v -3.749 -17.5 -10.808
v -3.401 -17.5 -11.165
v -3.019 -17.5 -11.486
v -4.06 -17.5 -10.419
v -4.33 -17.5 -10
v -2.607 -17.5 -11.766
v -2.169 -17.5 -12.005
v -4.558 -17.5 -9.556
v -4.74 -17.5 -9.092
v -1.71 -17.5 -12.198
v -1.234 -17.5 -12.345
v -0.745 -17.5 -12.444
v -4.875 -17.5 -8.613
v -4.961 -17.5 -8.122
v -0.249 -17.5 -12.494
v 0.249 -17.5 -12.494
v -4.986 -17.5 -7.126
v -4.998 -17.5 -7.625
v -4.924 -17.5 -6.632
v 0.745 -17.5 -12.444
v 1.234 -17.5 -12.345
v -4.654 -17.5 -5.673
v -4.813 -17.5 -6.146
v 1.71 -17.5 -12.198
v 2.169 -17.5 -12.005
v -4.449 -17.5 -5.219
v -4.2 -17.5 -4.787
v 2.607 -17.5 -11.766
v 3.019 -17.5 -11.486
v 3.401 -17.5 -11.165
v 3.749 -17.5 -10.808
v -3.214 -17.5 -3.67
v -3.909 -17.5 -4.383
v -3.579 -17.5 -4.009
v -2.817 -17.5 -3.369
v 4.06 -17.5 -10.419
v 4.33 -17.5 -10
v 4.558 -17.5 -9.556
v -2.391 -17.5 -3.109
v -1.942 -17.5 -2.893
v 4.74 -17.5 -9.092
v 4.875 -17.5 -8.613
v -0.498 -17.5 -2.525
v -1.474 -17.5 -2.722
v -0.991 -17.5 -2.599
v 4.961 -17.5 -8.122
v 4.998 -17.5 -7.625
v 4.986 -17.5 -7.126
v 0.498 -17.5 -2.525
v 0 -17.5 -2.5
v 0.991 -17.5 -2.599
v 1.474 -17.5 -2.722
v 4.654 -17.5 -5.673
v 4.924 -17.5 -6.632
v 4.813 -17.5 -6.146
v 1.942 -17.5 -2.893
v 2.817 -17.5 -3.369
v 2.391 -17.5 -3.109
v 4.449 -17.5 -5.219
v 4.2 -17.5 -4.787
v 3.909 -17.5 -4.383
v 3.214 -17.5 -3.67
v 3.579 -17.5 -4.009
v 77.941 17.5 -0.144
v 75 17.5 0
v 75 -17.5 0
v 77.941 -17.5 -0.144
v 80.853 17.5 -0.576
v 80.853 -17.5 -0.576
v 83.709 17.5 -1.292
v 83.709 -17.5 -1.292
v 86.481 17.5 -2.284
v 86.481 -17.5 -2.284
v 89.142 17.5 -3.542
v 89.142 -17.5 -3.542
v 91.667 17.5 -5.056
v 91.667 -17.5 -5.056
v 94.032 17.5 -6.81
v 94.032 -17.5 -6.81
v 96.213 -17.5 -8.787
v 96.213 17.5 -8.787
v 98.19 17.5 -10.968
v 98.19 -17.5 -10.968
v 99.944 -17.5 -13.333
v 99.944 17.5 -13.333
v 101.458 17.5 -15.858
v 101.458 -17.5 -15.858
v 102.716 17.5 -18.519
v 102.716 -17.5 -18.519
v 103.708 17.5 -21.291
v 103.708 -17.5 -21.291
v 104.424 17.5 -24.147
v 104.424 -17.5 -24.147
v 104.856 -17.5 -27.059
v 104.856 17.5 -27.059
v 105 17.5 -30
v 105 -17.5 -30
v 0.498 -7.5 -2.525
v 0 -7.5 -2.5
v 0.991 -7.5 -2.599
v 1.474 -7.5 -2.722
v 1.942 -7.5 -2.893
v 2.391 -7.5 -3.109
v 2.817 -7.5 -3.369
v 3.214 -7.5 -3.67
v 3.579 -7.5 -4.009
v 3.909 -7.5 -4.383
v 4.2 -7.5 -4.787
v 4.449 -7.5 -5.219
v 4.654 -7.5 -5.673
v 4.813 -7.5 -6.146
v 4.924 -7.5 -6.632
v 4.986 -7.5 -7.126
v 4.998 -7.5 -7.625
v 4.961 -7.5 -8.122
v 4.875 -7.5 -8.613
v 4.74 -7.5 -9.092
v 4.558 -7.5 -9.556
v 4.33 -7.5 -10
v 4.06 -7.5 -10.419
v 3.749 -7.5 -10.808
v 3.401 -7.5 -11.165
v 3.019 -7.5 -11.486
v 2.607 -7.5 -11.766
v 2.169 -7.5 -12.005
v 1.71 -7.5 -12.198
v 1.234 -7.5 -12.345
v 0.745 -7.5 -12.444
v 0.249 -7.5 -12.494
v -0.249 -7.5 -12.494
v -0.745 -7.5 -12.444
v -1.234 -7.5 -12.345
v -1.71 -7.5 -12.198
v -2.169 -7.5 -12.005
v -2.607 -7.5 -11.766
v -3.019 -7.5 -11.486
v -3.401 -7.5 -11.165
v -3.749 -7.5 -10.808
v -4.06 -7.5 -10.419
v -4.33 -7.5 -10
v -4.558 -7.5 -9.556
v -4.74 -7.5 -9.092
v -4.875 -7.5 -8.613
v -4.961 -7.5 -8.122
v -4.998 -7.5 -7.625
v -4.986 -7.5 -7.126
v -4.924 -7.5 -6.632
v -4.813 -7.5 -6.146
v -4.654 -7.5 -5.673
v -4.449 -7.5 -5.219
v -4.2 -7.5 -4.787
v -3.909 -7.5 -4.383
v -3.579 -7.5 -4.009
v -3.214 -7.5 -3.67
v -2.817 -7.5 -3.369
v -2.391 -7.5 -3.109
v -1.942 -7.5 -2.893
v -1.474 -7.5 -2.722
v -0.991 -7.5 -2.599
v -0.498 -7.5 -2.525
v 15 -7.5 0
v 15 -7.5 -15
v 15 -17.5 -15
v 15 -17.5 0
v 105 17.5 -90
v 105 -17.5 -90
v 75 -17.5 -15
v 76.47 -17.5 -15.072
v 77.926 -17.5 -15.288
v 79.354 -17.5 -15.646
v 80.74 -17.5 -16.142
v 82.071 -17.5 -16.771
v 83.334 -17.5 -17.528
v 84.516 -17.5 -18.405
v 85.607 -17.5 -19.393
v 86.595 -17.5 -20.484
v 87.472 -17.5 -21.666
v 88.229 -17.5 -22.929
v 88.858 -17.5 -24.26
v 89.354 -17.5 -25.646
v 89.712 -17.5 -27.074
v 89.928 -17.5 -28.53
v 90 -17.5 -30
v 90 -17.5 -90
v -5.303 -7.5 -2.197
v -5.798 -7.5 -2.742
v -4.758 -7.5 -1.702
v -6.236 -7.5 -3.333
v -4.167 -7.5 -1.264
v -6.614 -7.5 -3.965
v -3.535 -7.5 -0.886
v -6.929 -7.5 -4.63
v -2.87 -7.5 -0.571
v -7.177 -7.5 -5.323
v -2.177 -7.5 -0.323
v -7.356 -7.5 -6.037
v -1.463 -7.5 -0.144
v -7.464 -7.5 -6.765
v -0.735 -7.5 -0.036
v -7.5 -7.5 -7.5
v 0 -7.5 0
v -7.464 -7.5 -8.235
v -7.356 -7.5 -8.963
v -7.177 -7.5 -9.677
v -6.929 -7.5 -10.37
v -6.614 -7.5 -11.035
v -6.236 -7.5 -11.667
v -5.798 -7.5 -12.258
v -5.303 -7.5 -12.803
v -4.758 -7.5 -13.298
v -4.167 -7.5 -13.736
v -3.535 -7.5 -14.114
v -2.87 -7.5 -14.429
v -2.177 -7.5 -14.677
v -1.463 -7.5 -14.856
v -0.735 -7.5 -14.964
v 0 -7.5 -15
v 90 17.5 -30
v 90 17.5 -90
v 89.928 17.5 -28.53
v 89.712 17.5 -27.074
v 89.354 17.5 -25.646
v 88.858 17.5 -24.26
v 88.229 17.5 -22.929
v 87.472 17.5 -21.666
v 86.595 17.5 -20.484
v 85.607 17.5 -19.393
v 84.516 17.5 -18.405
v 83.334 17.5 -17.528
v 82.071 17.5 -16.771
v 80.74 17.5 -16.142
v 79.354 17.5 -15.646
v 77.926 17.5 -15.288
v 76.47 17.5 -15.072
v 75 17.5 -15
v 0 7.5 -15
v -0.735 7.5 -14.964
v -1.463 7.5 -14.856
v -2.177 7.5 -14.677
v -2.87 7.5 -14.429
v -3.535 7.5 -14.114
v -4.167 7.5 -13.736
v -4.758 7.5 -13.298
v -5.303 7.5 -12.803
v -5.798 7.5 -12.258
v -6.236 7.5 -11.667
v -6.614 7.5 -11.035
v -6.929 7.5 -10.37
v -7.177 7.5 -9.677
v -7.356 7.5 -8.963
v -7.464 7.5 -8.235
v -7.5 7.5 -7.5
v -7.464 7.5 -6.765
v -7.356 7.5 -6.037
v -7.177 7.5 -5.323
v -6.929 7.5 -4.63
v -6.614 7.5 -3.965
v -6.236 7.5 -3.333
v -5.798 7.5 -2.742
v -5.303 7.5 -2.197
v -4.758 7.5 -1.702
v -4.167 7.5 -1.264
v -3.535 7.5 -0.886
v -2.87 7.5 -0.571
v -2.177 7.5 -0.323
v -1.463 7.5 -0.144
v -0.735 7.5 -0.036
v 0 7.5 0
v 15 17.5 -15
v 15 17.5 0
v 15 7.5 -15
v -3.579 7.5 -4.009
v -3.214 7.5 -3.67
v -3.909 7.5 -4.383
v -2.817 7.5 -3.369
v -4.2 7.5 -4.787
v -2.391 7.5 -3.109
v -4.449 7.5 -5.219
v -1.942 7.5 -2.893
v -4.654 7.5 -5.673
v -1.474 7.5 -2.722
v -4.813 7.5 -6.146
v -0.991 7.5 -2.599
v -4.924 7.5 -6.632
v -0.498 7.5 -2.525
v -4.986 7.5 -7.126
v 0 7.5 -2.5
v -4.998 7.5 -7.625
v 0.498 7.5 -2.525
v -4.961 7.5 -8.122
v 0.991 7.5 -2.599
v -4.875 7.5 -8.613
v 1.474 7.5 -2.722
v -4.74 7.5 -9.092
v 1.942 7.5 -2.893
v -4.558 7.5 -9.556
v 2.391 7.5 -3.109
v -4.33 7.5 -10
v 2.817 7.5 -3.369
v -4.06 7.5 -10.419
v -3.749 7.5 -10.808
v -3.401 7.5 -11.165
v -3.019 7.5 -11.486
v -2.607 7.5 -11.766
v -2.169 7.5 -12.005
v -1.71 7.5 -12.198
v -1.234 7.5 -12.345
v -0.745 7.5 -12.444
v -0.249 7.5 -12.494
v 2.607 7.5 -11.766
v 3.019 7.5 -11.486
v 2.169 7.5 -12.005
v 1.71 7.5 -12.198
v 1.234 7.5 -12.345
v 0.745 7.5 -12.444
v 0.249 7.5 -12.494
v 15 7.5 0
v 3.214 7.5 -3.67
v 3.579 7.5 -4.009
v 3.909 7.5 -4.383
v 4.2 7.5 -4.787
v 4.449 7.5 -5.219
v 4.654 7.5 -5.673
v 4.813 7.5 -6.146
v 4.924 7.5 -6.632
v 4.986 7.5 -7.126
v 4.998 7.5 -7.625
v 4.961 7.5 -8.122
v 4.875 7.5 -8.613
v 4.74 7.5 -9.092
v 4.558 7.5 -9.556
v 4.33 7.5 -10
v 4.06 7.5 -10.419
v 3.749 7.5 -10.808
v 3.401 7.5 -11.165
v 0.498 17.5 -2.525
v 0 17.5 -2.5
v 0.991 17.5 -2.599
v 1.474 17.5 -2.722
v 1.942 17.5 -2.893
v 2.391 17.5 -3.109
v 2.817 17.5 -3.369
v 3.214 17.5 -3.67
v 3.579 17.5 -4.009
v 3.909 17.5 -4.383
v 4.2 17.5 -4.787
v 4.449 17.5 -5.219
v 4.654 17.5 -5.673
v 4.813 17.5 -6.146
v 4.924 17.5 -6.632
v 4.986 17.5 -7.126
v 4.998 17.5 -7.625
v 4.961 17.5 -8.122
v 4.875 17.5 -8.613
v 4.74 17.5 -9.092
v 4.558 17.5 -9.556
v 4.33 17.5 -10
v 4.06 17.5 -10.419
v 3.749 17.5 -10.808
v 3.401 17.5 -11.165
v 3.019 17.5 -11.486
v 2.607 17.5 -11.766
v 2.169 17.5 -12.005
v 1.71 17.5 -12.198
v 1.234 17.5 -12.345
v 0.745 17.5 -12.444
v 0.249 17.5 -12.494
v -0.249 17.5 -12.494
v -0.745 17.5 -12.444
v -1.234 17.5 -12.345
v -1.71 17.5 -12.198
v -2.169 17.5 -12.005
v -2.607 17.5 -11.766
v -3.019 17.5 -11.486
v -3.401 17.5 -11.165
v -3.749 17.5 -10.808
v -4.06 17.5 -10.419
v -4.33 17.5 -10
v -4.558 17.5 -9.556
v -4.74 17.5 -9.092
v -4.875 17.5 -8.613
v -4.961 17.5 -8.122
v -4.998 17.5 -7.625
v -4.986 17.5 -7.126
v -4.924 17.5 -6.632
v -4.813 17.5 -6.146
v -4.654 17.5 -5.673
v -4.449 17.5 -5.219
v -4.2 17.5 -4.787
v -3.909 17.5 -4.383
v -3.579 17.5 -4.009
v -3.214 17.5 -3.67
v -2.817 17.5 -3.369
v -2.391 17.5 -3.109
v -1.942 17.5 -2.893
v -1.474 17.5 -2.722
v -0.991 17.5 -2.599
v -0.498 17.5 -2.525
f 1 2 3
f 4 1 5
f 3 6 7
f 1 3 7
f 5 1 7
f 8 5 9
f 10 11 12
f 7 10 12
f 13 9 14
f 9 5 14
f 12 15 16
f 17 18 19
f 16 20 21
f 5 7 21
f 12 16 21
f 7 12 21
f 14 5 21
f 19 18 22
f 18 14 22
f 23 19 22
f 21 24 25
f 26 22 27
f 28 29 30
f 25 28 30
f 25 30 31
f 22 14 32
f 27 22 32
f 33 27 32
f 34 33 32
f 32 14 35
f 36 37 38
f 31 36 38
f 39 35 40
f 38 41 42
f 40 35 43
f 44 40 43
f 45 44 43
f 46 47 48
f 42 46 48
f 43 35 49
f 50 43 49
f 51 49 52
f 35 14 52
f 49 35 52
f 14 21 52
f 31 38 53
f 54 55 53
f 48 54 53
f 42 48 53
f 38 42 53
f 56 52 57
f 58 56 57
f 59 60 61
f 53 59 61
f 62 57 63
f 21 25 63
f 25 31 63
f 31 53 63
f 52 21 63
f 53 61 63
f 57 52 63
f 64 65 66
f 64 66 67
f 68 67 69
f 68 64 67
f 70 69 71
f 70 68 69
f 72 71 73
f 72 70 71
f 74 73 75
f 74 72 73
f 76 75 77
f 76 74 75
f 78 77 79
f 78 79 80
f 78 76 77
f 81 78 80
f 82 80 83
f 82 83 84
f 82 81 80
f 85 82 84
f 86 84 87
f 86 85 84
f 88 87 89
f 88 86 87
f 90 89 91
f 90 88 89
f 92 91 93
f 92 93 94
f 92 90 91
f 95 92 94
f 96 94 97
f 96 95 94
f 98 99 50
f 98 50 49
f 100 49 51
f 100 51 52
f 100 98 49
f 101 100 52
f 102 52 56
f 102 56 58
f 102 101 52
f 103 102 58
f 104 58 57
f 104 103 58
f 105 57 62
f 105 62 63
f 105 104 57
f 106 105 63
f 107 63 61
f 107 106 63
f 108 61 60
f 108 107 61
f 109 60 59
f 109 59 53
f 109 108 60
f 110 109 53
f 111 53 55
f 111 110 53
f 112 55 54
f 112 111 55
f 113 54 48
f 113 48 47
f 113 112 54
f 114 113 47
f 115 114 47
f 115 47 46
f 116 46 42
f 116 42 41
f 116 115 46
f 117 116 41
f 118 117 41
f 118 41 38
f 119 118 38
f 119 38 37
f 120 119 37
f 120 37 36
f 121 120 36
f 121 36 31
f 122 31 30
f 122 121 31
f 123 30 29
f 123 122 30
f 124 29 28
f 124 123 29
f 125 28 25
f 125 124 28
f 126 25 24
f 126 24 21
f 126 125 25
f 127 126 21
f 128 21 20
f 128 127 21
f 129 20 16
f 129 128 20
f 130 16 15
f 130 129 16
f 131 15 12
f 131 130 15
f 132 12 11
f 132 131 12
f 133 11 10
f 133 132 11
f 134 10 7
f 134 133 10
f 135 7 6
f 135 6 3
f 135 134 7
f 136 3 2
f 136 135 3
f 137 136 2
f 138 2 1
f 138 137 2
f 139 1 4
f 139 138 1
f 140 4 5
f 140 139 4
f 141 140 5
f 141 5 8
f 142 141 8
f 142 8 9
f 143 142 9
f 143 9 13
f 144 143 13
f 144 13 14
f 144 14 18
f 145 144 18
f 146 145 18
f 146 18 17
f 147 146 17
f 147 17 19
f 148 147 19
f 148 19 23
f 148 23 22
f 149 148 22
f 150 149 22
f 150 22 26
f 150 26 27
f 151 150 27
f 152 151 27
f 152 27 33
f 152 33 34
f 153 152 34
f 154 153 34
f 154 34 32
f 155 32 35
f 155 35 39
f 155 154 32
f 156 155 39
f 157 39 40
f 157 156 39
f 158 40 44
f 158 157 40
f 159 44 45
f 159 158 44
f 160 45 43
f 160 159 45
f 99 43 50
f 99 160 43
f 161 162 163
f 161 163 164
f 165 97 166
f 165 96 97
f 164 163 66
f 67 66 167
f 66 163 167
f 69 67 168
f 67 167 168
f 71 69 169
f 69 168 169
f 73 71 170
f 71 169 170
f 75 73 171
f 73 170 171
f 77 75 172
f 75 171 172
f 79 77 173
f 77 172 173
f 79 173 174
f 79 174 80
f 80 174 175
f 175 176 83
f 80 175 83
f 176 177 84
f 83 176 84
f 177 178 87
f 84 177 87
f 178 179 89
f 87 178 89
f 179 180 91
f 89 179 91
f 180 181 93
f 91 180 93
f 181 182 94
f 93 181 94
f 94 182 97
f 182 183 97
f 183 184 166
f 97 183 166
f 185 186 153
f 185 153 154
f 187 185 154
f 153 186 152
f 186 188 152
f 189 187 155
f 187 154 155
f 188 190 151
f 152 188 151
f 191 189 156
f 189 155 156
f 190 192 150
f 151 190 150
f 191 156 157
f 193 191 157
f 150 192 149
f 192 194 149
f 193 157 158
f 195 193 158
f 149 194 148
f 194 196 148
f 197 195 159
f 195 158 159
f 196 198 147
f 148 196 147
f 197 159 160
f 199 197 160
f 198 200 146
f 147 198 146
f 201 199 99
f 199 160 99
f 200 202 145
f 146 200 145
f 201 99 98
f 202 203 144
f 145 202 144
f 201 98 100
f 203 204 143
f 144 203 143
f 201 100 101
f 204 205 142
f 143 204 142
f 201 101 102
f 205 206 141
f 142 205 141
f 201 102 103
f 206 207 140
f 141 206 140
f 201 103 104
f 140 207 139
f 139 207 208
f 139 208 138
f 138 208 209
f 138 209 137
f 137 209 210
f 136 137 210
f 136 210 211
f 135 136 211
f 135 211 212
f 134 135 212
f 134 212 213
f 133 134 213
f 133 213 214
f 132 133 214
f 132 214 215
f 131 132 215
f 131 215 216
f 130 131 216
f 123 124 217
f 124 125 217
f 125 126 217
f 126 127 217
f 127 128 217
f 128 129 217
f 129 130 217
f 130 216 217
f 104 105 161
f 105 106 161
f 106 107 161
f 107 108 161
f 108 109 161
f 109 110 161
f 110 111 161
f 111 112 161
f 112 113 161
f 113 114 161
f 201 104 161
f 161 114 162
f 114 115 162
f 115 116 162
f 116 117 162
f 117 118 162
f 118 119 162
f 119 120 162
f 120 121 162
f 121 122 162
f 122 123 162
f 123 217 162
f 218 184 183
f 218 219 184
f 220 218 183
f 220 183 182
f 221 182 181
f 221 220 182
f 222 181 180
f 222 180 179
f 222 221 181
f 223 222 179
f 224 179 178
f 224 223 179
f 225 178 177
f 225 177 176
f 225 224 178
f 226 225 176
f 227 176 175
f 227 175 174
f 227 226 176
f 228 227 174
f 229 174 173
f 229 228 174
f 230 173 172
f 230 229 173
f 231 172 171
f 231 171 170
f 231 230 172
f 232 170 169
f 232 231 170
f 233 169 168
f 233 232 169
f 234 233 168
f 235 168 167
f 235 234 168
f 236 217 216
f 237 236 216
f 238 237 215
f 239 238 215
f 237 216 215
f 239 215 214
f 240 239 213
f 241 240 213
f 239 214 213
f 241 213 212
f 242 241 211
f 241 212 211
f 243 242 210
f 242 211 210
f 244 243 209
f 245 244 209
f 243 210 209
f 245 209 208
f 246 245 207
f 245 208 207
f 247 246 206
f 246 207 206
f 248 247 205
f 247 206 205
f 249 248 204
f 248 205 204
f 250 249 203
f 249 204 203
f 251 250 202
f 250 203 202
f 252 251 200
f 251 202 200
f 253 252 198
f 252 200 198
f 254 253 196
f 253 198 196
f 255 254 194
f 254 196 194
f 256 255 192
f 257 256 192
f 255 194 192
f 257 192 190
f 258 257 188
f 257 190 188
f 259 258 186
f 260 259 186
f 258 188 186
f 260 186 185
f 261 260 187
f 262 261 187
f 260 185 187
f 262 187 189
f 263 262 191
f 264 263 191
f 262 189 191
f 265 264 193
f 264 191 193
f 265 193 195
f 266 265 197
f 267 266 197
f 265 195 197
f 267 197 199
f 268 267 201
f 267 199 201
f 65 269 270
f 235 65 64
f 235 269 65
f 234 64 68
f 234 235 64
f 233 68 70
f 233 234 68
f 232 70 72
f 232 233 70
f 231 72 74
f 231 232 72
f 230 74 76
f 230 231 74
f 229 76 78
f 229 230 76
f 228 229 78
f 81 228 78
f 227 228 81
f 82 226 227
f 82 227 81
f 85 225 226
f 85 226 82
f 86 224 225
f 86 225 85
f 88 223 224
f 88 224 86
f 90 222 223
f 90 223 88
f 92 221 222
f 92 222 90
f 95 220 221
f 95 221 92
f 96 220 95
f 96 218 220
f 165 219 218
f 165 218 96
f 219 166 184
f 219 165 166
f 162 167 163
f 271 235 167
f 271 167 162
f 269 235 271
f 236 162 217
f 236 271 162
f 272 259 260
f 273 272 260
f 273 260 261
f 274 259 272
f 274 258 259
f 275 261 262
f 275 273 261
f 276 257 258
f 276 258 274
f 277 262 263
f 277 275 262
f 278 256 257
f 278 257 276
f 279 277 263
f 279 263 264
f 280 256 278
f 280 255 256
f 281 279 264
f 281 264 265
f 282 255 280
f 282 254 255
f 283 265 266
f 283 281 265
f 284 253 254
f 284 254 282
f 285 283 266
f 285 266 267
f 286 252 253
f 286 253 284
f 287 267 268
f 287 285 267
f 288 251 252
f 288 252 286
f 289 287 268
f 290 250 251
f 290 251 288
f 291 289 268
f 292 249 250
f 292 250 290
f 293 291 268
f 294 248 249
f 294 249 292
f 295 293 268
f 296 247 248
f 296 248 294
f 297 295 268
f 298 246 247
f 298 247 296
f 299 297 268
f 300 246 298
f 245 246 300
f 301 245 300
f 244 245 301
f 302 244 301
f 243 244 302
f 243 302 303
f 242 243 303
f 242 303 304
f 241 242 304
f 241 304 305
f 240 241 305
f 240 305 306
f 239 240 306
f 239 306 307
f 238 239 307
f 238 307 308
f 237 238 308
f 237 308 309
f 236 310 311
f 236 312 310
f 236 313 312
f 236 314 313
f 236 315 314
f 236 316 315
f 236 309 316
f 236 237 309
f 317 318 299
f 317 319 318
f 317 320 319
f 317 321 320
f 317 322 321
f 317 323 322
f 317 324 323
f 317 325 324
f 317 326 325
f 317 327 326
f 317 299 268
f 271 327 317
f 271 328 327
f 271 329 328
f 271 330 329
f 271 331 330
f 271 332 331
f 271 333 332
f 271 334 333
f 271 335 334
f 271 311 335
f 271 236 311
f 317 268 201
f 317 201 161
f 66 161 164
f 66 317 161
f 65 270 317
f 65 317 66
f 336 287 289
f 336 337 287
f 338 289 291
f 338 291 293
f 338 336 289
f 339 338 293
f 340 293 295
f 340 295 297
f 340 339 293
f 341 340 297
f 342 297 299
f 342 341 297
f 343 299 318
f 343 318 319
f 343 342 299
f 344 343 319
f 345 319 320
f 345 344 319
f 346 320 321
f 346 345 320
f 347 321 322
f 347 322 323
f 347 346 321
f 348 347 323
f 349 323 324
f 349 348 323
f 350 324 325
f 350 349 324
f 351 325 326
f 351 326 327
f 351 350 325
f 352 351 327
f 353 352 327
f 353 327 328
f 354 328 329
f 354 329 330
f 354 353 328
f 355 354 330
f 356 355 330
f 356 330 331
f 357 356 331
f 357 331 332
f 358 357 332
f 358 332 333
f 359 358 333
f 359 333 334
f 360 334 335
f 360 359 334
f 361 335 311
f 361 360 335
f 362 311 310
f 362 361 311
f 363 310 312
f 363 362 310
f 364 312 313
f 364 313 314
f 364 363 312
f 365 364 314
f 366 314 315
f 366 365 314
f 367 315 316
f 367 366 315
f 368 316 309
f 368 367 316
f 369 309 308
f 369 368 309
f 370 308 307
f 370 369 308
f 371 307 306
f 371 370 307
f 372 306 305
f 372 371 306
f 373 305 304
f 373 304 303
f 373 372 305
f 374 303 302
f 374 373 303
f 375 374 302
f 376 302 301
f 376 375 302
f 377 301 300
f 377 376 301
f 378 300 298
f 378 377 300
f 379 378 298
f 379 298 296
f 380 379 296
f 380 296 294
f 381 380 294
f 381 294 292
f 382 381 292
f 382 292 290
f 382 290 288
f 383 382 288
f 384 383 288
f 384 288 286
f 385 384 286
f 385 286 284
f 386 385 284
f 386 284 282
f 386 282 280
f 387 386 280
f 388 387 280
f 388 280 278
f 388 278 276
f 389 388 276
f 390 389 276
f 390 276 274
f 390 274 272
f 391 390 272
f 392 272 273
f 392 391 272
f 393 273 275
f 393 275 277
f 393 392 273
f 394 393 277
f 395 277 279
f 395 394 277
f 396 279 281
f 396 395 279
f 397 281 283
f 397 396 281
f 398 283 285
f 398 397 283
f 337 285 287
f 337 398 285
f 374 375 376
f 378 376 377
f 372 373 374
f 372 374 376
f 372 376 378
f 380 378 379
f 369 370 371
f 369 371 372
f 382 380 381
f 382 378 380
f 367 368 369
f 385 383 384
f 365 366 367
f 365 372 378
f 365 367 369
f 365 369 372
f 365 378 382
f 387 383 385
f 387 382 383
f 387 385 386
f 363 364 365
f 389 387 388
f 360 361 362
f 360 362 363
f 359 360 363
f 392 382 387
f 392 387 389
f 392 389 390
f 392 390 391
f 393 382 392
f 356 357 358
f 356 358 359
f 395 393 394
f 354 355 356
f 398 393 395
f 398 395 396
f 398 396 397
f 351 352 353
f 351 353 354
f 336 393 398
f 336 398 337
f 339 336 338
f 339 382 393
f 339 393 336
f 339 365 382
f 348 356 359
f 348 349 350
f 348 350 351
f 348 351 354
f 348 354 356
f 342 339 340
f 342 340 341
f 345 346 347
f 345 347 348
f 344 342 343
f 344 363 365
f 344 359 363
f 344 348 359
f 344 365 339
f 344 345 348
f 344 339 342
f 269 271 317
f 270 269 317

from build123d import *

# Parameters (mm, degrees)
EXTRUDE_1_DEPTH      = 7.5
EXTRUDE_1_DEPTH_BACK = 7.5
SKETCH_1_R           = 5
SKETCH_2_R           = 5
EXTRUDE_2_DEPTH      = 17.5
EXTRUDE_3_DEPTH      = 10


with BuildPart() as part:
    # 草图1 → 凸台-拉伸1 (new, two sides: drawn at the far end of the back side and taken through both)
    with BuildSketch(Plane(origin=(0, 0, 0), x_dir=(1, 0, 0), z_dir=(0, 1, 0)).offset(-EXTRUDE_1_DEPTH_BACK)):
        with BuildLine():
            Line((0, 0), (75, 0))
            ThreePointArc((75, 0), (96.213203436, 8.786796564), (105, 30))
            Line((105, 30), (105, 90))
            Line((105, 90), (90.00000671, 90))
            Line((90.00000671, 90), (90.00000671, 30))
            ThreePointArc((90.00000671, 30), (85.606608428, 19.393398282), (75.00000671, 15))
            Line((75.00000671, 15), (0, 15))
            ThreePointArc((0, 15), (-7.5, 7.5), (0, 0))
        make_face()
        with Locations((0, 7.5)):
            Circle(SKETCH_1_R, mode=Mode.SUBTRACT)
    extrude(amount=EXTRUDE_1_DEPTH + EXTRUDE_1_DEPTH_BACK)

    # 草图2 → 凸台-拉伸2 (add, symmetric)
    with BuildSketch(Plane(origin=(0, 0, 0), x_dir=(1, 0, 0), z_dir=(0, 1, 0))):
        with Locations((0, 7.5)):
            Circle(SKETCH_2_R)
    extrude(amount=EXTRUDE_2_DEPTH, both=True)

    # 草图3 → 凸台-拉伸3 (add)
    with BuildSketch(Plane(origin=(0, 7.5, 0), x_dir=(1, 0, 0), z_dir=(0, 1, 0))):
        with BuildLine():
            Line((90.00000671, 90), (90.00000671, 30))
            ThreePointArc((90.00000671, 30), (85.606608428, 19.393398282), (75.00000671, 15))
            Line((75.00000671, 15), (15.00000671, 15))
            Line((15.00000671, 15), (15.00000671, 0))
            Line((15.00000671, 0), (75, 0))
            ThreePointArc((75, 0), (96.213203436, 8.786796564), (105, 30))
            Line((105, 30), (105, 90))
            Line((105, 90), (90.00000671, 90))
        make_face()
    extrude_3 = extrude(amount=EXTRUDE_3_DEPTH)

    # 镜向1: 凸台-拉伸3 across plane
    add(extrude_3.mirror(Plane.ZX))


solid = part.part
